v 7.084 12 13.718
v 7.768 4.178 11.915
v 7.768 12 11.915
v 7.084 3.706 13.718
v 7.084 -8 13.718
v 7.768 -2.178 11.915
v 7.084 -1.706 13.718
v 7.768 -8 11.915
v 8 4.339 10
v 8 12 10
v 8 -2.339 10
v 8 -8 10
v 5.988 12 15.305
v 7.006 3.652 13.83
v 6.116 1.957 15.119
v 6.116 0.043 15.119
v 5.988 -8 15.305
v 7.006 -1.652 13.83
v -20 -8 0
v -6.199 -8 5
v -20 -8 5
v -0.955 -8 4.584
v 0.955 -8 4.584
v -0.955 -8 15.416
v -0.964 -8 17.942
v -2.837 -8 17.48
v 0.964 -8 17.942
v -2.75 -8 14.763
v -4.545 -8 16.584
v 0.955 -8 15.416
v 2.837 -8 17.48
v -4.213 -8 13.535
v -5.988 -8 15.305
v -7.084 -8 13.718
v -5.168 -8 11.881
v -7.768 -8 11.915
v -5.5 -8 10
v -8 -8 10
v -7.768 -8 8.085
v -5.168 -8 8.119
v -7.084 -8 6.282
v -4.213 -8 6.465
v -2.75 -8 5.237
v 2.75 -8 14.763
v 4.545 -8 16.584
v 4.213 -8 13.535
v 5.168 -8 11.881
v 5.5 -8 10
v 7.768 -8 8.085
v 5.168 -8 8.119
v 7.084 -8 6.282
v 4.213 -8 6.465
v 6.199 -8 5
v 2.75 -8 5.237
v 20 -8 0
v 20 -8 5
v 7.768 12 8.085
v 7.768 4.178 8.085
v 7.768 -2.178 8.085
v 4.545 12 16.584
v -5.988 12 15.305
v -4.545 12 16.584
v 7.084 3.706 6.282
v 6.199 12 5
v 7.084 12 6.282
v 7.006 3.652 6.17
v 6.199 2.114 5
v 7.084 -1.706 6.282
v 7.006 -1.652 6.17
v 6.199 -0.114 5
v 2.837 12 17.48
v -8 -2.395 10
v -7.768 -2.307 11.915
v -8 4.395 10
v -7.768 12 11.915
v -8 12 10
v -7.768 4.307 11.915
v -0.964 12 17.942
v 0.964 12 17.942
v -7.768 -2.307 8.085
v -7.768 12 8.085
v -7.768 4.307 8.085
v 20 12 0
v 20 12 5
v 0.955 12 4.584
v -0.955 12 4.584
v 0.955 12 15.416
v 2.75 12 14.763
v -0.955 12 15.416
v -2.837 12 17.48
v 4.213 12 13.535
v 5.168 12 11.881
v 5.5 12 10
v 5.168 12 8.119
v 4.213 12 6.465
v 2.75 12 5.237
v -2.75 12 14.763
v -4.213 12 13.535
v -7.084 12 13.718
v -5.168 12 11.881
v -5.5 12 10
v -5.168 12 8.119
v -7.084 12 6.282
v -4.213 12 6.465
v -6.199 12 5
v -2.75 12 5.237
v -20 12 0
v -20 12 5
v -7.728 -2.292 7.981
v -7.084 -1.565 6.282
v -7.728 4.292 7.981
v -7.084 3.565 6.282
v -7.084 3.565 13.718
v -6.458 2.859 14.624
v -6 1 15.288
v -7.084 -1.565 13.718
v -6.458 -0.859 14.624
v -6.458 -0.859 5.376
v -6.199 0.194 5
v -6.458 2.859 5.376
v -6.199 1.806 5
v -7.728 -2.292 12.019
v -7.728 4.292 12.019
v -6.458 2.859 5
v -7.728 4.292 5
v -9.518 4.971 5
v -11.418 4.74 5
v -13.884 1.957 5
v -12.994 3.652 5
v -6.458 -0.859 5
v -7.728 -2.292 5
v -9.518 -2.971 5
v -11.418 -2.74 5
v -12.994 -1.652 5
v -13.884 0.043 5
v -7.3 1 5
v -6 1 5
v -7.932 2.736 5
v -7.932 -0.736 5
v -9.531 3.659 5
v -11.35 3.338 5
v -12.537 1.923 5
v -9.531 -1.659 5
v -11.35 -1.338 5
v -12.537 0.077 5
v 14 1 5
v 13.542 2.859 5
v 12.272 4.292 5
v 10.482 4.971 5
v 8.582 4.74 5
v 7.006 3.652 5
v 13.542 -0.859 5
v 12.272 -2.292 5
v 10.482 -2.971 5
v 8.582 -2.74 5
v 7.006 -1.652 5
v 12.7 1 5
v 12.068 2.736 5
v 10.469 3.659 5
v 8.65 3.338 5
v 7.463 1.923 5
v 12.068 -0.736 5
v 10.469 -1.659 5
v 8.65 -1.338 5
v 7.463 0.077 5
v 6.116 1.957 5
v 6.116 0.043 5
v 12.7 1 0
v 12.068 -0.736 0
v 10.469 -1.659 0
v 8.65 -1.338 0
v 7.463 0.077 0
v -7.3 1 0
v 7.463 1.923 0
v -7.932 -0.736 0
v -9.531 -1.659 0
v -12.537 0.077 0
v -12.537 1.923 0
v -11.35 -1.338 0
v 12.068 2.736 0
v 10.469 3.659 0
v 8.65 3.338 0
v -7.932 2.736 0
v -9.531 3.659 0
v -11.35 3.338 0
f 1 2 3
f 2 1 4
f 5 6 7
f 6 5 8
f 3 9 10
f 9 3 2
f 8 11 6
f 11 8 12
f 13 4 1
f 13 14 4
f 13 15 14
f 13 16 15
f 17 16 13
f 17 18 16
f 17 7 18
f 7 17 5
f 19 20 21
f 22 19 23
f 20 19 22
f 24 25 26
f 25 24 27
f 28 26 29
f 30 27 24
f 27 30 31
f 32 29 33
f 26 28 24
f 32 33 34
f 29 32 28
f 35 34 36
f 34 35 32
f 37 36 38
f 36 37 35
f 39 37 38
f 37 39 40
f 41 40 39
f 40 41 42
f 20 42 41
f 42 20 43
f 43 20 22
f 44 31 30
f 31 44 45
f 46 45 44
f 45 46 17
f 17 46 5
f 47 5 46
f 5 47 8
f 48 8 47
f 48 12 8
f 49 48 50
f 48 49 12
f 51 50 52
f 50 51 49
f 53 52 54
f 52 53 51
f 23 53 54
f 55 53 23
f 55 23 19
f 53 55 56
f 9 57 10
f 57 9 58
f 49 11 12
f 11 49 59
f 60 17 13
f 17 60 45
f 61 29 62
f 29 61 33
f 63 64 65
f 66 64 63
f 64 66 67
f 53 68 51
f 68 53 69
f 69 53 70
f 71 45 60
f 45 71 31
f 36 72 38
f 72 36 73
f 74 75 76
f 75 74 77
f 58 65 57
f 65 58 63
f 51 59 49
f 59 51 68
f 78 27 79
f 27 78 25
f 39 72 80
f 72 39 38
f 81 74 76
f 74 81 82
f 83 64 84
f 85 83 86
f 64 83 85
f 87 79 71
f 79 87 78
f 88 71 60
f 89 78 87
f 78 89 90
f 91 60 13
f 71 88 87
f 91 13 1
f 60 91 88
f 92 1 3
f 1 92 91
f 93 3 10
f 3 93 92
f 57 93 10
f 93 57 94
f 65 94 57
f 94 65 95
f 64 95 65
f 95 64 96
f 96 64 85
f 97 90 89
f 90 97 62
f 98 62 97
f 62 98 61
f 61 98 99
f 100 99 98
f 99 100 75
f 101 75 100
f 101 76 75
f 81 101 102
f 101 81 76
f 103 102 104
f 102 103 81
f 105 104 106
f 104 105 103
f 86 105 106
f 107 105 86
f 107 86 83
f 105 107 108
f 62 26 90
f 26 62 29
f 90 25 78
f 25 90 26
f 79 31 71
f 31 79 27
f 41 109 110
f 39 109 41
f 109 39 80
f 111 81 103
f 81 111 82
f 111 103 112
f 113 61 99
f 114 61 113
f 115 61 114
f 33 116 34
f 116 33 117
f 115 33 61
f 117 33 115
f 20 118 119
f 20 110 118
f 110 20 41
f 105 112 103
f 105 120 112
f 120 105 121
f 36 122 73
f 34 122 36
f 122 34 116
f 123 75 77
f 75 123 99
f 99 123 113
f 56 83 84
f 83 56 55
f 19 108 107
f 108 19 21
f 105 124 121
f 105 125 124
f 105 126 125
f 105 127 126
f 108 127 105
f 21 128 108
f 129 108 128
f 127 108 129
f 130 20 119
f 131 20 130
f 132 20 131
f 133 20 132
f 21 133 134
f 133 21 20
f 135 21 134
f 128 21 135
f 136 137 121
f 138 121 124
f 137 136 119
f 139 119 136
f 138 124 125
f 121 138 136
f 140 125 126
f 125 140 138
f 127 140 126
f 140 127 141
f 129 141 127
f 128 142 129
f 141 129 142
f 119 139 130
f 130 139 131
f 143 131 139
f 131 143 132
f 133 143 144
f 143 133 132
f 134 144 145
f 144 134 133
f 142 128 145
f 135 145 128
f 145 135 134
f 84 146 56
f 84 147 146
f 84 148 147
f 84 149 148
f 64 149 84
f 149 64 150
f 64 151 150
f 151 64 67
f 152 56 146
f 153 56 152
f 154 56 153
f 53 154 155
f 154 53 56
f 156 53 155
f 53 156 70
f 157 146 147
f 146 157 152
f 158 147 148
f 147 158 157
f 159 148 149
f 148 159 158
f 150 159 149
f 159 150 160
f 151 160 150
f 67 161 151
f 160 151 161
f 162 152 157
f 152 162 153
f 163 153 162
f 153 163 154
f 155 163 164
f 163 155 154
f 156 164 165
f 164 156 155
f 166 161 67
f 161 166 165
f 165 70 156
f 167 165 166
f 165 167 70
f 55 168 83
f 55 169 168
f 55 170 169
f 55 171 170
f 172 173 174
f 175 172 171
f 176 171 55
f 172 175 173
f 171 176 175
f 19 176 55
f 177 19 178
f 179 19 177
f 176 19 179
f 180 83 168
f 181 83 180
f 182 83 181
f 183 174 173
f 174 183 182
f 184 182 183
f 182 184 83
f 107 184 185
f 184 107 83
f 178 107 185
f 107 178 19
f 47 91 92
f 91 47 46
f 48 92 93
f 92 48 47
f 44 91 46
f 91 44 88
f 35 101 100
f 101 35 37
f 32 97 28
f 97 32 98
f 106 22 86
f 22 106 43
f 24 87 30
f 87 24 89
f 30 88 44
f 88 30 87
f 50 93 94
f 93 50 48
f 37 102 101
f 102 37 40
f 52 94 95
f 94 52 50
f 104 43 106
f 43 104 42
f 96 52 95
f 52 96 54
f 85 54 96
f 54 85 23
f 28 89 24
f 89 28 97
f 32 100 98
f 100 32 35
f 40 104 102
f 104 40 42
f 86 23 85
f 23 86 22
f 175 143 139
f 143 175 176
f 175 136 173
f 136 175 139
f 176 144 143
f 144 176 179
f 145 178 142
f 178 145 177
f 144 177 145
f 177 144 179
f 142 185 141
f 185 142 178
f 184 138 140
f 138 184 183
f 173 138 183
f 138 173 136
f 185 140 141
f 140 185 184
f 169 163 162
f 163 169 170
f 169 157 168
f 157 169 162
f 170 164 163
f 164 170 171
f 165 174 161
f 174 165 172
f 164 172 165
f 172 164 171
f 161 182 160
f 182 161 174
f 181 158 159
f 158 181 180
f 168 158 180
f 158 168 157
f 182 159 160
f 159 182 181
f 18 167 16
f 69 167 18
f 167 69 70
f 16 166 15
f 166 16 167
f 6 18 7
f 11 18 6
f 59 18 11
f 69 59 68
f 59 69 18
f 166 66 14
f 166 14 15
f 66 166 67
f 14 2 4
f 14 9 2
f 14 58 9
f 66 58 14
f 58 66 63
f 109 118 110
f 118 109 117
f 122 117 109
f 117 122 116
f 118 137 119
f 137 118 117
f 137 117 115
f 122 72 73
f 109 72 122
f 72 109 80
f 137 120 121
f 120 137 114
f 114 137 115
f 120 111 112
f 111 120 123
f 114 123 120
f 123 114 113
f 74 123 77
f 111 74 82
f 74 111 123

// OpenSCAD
translate([0,30,10]) 
rotate([90,0,0])
difference() {

	// mount
	//
	translate([0,0,18]) 
	union() {
		cylinder(r=8,h=20);
		translate([-20,-10,0]) cube([40,5,20]);
	}

	// pen holder inside
	// 
	cylinder(r=11/2,h=40);
	translate([0,0,28]);
	
	// screw holes
	//
	rotate([90,0,0]) translate([-10,29,-10]) cylinder(r=2.7,h=22);
	rotate([90,0,0]) translate([10,29,-10]) cylinder(r=2.7,h=22);

	// screw head clearnence
	//
	rotate([90,0,0]) translate([10,29,-10]) cylinder(r=4,h=15);
	rotate([90,0,0]) translate([-10,29,-10]) cylinder(r=4,h=15);

}
